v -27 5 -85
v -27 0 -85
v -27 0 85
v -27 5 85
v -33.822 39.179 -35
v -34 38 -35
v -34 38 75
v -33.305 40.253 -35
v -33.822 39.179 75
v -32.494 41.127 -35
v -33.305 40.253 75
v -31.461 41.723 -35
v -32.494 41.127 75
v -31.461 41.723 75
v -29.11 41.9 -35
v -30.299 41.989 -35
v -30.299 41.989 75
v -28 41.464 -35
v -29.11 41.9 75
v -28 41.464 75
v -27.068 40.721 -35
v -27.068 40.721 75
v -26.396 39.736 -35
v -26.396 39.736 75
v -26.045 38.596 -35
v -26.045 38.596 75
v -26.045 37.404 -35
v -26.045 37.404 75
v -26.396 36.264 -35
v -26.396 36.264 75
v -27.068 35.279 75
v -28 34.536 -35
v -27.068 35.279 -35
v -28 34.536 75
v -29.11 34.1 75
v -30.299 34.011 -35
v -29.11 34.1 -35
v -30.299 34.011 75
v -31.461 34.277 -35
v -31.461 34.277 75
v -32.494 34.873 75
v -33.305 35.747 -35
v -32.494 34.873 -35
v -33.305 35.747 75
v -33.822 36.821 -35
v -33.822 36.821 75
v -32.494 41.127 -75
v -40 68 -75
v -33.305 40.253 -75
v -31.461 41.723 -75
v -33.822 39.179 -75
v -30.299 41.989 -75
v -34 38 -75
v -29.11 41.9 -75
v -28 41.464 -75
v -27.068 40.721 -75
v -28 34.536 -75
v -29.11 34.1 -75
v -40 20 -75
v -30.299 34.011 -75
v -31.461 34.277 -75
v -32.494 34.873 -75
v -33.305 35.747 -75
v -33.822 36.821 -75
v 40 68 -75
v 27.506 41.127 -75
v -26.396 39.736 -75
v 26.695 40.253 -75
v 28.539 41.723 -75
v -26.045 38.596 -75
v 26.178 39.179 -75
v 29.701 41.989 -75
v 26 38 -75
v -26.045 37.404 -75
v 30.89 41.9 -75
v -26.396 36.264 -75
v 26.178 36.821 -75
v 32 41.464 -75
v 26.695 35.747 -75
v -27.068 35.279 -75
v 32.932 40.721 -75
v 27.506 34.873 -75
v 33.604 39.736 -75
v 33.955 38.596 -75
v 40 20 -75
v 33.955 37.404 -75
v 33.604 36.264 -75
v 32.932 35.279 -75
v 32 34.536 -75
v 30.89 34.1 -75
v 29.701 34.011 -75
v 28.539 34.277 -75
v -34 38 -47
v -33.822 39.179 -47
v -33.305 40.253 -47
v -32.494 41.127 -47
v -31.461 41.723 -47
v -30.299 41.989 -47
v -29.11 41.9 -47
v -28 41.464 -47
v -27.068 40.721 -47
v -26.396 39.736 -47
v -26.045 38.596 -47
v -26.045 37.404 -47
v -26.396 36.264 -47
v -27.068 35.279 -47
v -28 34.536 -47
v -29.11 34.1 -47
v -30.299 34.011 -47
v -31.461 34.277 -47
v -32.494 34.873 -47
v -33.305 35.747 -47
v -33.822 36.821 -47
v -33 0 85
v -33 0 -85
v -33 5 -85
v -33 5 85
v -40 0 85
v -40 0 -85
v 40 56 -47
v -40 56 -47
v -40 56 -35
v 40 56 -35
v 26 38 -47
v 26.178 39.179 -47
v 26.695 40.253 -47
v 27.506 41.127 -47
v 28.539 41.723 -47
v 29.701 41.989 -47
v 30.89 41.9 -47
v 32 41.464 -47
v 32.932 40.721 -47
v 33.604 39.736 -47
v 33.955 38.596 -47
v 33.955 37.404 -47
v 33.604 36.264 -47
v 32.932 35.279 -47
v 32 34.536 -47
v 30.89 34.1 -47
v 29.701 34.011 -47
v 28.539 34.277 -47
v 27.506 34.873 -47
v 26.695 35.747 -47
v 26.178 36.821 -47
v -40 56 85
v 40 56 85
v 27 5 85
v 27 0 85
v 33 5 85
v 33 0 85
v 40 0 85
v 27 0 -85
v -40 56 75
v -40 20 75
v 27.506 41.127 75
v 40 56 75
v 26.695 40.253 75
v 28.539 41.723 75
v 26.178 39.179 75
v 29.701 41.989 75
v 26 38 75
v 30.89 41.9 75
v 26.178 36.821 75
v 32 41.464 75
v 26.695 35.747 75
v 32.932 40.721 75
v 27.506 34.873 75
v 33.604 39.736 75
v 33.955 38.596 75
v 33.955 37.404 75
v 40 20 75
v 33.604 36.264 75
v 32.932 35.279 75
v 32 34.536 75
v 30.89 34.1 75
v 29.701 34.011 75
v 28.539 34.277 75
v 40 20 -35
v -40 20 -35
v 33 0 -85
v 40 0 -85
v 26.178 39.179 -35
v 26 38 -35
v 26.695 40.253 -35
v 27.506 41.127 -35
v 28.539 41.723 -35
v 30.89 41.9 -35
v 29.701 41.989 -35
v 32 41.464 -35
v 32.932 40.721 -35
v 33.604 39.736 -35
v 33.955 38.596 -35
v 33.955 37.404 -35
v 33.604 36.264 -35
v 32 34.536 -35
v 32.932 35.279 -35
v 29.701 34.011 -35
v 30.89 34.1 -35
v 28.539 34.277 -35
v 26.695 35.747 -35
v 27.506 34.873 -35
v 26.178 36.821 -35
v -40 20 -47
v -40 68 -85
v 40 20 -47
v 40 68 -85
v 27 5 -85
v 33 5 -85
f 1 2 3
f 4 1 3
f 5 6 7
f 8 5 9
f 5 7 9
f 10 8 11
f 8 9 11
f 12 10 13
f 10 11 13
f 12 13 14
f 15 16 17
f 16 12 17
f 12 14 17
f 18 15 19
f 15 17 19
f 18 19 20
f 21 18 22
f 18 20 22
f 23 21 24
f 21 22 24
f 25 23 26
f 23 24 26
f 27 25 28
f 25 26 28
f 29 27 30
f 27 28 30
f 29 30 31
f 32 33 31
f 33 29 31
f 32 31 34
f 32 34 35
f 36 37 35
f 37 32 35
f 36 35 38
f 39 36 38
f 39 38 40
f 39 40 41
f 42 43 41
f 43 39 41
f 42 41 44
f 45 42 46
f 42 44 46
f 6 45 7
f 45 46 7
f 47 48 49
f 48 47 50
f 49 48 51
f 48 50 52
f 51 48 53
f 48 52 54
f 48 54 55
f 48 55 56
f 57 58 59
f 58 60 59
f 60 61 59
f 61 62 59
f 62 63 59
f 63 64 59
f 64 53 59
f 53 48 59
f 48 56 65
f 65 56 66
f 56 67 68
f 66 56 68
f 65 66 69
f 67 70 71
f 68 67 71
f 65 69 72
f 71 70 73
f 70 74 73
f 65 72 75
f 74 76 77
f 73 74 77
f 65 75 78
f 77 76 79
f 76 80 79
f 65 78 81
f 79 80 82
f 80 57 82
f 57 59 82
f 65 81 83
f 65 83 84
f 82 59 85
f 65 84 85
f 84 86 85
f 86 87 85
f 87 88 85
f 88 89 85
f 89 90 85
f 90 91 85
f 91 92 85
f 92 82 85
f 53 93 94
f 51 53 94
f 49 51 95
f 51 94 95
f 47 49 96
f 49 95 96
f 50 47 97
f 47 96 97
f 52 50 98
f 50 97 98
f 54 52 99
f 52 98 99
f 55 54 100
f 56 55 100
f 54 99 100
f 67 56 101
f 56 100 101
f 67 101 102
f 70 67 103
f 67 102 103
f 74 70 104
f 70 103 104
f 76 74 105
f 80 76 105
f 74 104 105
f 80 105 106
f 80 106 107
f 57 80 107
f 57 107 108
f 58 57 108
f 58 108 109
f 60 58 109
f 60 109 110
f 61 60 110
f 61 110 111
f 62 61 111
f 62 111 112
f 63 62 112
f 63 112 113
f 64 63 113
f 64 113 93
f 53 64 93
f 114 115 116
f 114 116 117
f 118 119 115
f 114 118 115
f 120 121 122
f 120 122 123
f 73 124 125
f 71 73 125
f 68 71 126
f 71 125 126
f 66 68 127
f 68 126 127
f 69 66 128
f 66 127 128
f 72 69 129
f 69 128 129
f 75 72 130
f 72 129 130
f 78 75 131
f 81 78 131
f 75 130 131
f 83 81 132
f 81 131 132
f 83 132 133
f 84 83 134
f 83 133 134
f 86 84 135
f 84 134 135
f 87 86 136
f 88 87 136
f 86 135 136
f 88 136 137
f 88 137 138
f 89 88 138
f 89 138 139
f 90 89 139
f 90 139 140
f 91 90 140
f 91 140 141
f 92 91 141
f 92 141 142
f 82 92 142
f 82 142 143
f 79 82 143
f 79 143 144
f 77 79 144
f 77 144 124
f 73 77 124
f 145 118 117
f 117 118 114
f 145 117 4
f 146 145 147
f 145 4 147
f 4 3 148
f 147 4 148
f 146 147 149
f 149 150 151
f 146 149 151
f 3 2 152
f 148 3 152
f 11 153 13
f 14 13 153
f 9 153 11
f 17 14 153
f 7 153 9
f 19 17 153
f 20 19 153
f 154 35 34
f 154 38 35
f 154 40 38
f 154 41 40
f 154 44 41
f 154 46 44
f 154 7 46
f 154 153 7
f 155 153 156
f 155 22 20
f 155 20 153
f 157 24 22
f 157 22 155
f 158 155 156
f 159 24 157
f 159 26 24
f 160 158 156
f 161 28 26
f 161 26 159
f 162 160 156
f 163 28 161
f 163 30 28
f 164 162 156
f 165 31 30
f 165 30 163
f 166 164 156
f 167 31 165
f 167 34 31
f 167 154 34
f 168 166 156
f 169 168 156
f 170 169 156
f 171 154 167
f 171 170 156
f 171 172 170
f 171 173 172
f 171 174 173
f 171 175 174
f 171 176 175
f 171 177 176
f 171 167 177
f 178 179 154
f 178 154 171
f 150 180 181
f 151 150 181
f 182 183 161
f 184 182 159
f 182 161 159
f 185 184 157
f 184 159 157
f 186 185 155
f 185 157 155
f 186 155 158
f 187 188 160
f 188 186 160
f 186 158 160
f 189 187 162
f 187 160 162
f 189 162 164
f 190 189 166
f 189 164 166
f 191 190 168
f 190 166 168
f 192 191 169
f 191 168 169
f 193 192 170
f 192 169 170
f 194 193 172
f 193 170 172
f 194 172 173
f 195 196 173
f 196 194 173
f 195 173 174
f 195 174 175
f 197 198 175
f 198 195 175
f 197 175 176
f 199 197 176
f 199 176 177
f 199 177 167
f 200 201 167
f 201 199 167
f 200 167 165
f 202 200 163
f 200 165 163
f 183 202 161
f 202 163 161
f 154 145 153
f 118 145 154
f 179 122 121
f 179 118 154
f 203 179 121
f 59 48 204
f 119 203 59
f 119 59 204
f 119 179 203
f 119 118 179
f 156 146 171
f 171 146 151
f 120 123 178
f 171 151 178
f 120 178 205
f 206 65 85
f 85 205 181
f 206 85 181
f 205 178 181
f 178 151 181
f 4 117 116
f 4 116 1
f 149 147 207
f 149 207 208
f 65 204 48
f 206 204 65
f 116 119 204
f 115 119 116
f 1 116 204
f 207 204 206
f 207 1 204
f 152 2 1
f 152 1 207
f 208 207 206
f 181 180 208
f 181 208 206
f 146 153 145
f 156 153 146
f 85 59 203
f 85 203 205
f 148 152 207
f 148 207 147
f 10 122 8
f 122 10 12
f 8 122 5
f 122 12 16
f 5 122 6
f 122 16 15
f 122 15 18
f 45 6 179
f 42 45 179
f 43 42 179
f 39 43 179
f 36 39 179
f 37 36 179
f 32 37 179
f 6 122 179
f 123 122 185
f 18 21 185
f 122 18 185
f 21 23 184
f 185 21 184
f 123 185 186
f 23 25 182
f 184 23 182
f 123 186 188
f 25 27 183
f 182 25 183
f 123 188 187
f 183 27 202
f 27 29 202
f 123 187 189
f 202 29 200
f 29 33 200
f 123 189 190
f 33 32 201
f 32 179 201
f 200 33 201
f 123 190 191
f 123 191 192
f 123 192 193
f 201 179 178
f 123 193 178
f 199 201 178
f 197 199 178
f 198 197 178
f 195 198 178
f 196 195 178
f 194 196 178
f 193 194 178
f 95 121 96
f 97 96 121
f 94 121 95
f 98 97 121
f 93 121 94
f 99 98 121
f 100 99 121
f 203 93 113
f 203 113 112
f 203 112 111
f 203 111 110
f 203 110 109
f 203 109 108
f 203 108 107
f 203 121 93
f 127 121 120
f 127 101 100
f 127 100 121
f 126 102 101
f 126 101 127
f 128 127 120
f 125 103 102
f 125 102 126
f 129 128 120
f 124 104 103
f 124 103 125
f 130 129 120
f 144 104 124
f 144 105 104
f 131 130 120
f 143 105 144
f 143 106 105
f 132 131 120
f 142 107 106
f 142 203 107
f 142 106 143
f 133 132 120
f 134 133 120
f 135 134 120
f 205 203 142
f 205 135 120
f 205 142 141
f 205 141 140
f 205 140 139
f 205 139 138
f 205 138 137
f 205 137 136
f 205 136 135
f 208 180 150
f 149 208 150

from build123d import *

# Parameters (mm, degrees)
SKETCH1_W             = 80
SKETCH1_H             = 28
BOSS_EXTRUDE1_DEPTH   = 20
SKETCH1_H_2           = 110
BOSS_EXTRUDE1_2_DEPTH = 20
SKETCH1_3_W           = 80
SKETCH1_3_H           = 12
SKETCH1_3_H_2         = 10
BOSS_EXTRUDE2_DEPTH   = 56
SKETCH1_4_W           = 80
SKETCH1_4_H           = 10
BOSS_EXTRUDE3_DEPTH   = 68
SKETCH2_R             = 4
BOSS_EXTRUDE4_DEPTH   = 150
SKETCH3_W             = 6
SKETCH3_H             = 170
CUT_EXTRUDE1_DEPTH    = 5


with BuildPart() as part:
    # Sketch1 → Boss-Extrude1 (new body)
    with BuildSketch(Plane(origin=(0, 0, 0), x_dir=(1, 0, 0), z_dir=(0, 1, 0))):
        with Locations((0, 61)):
            Rectangle(SKETCH1_W, SKETCH1_H)
    extrude(amount=BOSS_EXTRUDE1_DEPTH)



with BuildPart() as body_2:
    # Sketch1 → Boss-Extrude1 2 (new body)
    with BuildSketch(Plane(origin=(0, 0, 0), x_dir=(1, 0, 0), z_dir=(0, 1, 0))):
        with Locations((0, -20)):
            Rectangle(SKETCH1_W, SKETCH1_H_2)
    extrude(amount=BOSS_EXTRUDE1_2_DEPTH)


with BuildPart() as part_1:
    add(part.part)

    add(body_2.part)  # Boss-Extrude2 merges body 2
    # Sketch1<3> → Boss-Extrude2 (add)
    with BuildSketch(Plane(origin=(0, 0, 0), x_dir=(1, 0, 0), z_dir=(0, 1, 0))):
        with Locations((0, 41)):
            Rectangle(SKETCH1_3_W, SKETCH1_3_H)
        with Locations((0, -80)):
            Rectangle(SKETCH1_3_W, SKETCH1_3_H_2)
    extrude(amount=BOSS_EXTRUDE2_DEPTH)

    # Sketch1<4> → Boss-Extrude3 (add)
    with BuildSketch(Plane(origin=(0, 0, 0), x_dir=(1, 0, 0), z_dir=(0, 1, 0))):
        with Locations((0, 80)):
            Rectangle(SKETCH1_4_W, SKETCH1_4_H)
    extrude(amount=BOSS_EXTRUDE3_DEPTH)

    # Sketch2 → Boss-Extrude4 (add)
    with BuildSketch(Plane(origin=(0, 0, 75), x_dir=(-1, 0, 0), z_dir=(0, 0, -1))):
        with Locations((-30, 38)):
            Circle(SKETCH2_R)
        with Locations((30, 38)):
            Circle(SKETCH2_R)
    extrude(amount=BOSS_EXTRUDE4_DEPTH)

    # Sketch3 → Cut-Extrude1 (cut)
    with BuildSketch(Plane.XZ):
        with Locations((-30, 0)):
            Rectangle(SKETCH3_W, SKETCH3_H)
        with Locations((30, 0)):
            Rectangle(SKETCH3_W, SKETCH3_H)
    extrude(amount=-CUT_EXTRUDE1_DEPTH, mode=Mode.SUBTRACT)


solid = part_1.part
